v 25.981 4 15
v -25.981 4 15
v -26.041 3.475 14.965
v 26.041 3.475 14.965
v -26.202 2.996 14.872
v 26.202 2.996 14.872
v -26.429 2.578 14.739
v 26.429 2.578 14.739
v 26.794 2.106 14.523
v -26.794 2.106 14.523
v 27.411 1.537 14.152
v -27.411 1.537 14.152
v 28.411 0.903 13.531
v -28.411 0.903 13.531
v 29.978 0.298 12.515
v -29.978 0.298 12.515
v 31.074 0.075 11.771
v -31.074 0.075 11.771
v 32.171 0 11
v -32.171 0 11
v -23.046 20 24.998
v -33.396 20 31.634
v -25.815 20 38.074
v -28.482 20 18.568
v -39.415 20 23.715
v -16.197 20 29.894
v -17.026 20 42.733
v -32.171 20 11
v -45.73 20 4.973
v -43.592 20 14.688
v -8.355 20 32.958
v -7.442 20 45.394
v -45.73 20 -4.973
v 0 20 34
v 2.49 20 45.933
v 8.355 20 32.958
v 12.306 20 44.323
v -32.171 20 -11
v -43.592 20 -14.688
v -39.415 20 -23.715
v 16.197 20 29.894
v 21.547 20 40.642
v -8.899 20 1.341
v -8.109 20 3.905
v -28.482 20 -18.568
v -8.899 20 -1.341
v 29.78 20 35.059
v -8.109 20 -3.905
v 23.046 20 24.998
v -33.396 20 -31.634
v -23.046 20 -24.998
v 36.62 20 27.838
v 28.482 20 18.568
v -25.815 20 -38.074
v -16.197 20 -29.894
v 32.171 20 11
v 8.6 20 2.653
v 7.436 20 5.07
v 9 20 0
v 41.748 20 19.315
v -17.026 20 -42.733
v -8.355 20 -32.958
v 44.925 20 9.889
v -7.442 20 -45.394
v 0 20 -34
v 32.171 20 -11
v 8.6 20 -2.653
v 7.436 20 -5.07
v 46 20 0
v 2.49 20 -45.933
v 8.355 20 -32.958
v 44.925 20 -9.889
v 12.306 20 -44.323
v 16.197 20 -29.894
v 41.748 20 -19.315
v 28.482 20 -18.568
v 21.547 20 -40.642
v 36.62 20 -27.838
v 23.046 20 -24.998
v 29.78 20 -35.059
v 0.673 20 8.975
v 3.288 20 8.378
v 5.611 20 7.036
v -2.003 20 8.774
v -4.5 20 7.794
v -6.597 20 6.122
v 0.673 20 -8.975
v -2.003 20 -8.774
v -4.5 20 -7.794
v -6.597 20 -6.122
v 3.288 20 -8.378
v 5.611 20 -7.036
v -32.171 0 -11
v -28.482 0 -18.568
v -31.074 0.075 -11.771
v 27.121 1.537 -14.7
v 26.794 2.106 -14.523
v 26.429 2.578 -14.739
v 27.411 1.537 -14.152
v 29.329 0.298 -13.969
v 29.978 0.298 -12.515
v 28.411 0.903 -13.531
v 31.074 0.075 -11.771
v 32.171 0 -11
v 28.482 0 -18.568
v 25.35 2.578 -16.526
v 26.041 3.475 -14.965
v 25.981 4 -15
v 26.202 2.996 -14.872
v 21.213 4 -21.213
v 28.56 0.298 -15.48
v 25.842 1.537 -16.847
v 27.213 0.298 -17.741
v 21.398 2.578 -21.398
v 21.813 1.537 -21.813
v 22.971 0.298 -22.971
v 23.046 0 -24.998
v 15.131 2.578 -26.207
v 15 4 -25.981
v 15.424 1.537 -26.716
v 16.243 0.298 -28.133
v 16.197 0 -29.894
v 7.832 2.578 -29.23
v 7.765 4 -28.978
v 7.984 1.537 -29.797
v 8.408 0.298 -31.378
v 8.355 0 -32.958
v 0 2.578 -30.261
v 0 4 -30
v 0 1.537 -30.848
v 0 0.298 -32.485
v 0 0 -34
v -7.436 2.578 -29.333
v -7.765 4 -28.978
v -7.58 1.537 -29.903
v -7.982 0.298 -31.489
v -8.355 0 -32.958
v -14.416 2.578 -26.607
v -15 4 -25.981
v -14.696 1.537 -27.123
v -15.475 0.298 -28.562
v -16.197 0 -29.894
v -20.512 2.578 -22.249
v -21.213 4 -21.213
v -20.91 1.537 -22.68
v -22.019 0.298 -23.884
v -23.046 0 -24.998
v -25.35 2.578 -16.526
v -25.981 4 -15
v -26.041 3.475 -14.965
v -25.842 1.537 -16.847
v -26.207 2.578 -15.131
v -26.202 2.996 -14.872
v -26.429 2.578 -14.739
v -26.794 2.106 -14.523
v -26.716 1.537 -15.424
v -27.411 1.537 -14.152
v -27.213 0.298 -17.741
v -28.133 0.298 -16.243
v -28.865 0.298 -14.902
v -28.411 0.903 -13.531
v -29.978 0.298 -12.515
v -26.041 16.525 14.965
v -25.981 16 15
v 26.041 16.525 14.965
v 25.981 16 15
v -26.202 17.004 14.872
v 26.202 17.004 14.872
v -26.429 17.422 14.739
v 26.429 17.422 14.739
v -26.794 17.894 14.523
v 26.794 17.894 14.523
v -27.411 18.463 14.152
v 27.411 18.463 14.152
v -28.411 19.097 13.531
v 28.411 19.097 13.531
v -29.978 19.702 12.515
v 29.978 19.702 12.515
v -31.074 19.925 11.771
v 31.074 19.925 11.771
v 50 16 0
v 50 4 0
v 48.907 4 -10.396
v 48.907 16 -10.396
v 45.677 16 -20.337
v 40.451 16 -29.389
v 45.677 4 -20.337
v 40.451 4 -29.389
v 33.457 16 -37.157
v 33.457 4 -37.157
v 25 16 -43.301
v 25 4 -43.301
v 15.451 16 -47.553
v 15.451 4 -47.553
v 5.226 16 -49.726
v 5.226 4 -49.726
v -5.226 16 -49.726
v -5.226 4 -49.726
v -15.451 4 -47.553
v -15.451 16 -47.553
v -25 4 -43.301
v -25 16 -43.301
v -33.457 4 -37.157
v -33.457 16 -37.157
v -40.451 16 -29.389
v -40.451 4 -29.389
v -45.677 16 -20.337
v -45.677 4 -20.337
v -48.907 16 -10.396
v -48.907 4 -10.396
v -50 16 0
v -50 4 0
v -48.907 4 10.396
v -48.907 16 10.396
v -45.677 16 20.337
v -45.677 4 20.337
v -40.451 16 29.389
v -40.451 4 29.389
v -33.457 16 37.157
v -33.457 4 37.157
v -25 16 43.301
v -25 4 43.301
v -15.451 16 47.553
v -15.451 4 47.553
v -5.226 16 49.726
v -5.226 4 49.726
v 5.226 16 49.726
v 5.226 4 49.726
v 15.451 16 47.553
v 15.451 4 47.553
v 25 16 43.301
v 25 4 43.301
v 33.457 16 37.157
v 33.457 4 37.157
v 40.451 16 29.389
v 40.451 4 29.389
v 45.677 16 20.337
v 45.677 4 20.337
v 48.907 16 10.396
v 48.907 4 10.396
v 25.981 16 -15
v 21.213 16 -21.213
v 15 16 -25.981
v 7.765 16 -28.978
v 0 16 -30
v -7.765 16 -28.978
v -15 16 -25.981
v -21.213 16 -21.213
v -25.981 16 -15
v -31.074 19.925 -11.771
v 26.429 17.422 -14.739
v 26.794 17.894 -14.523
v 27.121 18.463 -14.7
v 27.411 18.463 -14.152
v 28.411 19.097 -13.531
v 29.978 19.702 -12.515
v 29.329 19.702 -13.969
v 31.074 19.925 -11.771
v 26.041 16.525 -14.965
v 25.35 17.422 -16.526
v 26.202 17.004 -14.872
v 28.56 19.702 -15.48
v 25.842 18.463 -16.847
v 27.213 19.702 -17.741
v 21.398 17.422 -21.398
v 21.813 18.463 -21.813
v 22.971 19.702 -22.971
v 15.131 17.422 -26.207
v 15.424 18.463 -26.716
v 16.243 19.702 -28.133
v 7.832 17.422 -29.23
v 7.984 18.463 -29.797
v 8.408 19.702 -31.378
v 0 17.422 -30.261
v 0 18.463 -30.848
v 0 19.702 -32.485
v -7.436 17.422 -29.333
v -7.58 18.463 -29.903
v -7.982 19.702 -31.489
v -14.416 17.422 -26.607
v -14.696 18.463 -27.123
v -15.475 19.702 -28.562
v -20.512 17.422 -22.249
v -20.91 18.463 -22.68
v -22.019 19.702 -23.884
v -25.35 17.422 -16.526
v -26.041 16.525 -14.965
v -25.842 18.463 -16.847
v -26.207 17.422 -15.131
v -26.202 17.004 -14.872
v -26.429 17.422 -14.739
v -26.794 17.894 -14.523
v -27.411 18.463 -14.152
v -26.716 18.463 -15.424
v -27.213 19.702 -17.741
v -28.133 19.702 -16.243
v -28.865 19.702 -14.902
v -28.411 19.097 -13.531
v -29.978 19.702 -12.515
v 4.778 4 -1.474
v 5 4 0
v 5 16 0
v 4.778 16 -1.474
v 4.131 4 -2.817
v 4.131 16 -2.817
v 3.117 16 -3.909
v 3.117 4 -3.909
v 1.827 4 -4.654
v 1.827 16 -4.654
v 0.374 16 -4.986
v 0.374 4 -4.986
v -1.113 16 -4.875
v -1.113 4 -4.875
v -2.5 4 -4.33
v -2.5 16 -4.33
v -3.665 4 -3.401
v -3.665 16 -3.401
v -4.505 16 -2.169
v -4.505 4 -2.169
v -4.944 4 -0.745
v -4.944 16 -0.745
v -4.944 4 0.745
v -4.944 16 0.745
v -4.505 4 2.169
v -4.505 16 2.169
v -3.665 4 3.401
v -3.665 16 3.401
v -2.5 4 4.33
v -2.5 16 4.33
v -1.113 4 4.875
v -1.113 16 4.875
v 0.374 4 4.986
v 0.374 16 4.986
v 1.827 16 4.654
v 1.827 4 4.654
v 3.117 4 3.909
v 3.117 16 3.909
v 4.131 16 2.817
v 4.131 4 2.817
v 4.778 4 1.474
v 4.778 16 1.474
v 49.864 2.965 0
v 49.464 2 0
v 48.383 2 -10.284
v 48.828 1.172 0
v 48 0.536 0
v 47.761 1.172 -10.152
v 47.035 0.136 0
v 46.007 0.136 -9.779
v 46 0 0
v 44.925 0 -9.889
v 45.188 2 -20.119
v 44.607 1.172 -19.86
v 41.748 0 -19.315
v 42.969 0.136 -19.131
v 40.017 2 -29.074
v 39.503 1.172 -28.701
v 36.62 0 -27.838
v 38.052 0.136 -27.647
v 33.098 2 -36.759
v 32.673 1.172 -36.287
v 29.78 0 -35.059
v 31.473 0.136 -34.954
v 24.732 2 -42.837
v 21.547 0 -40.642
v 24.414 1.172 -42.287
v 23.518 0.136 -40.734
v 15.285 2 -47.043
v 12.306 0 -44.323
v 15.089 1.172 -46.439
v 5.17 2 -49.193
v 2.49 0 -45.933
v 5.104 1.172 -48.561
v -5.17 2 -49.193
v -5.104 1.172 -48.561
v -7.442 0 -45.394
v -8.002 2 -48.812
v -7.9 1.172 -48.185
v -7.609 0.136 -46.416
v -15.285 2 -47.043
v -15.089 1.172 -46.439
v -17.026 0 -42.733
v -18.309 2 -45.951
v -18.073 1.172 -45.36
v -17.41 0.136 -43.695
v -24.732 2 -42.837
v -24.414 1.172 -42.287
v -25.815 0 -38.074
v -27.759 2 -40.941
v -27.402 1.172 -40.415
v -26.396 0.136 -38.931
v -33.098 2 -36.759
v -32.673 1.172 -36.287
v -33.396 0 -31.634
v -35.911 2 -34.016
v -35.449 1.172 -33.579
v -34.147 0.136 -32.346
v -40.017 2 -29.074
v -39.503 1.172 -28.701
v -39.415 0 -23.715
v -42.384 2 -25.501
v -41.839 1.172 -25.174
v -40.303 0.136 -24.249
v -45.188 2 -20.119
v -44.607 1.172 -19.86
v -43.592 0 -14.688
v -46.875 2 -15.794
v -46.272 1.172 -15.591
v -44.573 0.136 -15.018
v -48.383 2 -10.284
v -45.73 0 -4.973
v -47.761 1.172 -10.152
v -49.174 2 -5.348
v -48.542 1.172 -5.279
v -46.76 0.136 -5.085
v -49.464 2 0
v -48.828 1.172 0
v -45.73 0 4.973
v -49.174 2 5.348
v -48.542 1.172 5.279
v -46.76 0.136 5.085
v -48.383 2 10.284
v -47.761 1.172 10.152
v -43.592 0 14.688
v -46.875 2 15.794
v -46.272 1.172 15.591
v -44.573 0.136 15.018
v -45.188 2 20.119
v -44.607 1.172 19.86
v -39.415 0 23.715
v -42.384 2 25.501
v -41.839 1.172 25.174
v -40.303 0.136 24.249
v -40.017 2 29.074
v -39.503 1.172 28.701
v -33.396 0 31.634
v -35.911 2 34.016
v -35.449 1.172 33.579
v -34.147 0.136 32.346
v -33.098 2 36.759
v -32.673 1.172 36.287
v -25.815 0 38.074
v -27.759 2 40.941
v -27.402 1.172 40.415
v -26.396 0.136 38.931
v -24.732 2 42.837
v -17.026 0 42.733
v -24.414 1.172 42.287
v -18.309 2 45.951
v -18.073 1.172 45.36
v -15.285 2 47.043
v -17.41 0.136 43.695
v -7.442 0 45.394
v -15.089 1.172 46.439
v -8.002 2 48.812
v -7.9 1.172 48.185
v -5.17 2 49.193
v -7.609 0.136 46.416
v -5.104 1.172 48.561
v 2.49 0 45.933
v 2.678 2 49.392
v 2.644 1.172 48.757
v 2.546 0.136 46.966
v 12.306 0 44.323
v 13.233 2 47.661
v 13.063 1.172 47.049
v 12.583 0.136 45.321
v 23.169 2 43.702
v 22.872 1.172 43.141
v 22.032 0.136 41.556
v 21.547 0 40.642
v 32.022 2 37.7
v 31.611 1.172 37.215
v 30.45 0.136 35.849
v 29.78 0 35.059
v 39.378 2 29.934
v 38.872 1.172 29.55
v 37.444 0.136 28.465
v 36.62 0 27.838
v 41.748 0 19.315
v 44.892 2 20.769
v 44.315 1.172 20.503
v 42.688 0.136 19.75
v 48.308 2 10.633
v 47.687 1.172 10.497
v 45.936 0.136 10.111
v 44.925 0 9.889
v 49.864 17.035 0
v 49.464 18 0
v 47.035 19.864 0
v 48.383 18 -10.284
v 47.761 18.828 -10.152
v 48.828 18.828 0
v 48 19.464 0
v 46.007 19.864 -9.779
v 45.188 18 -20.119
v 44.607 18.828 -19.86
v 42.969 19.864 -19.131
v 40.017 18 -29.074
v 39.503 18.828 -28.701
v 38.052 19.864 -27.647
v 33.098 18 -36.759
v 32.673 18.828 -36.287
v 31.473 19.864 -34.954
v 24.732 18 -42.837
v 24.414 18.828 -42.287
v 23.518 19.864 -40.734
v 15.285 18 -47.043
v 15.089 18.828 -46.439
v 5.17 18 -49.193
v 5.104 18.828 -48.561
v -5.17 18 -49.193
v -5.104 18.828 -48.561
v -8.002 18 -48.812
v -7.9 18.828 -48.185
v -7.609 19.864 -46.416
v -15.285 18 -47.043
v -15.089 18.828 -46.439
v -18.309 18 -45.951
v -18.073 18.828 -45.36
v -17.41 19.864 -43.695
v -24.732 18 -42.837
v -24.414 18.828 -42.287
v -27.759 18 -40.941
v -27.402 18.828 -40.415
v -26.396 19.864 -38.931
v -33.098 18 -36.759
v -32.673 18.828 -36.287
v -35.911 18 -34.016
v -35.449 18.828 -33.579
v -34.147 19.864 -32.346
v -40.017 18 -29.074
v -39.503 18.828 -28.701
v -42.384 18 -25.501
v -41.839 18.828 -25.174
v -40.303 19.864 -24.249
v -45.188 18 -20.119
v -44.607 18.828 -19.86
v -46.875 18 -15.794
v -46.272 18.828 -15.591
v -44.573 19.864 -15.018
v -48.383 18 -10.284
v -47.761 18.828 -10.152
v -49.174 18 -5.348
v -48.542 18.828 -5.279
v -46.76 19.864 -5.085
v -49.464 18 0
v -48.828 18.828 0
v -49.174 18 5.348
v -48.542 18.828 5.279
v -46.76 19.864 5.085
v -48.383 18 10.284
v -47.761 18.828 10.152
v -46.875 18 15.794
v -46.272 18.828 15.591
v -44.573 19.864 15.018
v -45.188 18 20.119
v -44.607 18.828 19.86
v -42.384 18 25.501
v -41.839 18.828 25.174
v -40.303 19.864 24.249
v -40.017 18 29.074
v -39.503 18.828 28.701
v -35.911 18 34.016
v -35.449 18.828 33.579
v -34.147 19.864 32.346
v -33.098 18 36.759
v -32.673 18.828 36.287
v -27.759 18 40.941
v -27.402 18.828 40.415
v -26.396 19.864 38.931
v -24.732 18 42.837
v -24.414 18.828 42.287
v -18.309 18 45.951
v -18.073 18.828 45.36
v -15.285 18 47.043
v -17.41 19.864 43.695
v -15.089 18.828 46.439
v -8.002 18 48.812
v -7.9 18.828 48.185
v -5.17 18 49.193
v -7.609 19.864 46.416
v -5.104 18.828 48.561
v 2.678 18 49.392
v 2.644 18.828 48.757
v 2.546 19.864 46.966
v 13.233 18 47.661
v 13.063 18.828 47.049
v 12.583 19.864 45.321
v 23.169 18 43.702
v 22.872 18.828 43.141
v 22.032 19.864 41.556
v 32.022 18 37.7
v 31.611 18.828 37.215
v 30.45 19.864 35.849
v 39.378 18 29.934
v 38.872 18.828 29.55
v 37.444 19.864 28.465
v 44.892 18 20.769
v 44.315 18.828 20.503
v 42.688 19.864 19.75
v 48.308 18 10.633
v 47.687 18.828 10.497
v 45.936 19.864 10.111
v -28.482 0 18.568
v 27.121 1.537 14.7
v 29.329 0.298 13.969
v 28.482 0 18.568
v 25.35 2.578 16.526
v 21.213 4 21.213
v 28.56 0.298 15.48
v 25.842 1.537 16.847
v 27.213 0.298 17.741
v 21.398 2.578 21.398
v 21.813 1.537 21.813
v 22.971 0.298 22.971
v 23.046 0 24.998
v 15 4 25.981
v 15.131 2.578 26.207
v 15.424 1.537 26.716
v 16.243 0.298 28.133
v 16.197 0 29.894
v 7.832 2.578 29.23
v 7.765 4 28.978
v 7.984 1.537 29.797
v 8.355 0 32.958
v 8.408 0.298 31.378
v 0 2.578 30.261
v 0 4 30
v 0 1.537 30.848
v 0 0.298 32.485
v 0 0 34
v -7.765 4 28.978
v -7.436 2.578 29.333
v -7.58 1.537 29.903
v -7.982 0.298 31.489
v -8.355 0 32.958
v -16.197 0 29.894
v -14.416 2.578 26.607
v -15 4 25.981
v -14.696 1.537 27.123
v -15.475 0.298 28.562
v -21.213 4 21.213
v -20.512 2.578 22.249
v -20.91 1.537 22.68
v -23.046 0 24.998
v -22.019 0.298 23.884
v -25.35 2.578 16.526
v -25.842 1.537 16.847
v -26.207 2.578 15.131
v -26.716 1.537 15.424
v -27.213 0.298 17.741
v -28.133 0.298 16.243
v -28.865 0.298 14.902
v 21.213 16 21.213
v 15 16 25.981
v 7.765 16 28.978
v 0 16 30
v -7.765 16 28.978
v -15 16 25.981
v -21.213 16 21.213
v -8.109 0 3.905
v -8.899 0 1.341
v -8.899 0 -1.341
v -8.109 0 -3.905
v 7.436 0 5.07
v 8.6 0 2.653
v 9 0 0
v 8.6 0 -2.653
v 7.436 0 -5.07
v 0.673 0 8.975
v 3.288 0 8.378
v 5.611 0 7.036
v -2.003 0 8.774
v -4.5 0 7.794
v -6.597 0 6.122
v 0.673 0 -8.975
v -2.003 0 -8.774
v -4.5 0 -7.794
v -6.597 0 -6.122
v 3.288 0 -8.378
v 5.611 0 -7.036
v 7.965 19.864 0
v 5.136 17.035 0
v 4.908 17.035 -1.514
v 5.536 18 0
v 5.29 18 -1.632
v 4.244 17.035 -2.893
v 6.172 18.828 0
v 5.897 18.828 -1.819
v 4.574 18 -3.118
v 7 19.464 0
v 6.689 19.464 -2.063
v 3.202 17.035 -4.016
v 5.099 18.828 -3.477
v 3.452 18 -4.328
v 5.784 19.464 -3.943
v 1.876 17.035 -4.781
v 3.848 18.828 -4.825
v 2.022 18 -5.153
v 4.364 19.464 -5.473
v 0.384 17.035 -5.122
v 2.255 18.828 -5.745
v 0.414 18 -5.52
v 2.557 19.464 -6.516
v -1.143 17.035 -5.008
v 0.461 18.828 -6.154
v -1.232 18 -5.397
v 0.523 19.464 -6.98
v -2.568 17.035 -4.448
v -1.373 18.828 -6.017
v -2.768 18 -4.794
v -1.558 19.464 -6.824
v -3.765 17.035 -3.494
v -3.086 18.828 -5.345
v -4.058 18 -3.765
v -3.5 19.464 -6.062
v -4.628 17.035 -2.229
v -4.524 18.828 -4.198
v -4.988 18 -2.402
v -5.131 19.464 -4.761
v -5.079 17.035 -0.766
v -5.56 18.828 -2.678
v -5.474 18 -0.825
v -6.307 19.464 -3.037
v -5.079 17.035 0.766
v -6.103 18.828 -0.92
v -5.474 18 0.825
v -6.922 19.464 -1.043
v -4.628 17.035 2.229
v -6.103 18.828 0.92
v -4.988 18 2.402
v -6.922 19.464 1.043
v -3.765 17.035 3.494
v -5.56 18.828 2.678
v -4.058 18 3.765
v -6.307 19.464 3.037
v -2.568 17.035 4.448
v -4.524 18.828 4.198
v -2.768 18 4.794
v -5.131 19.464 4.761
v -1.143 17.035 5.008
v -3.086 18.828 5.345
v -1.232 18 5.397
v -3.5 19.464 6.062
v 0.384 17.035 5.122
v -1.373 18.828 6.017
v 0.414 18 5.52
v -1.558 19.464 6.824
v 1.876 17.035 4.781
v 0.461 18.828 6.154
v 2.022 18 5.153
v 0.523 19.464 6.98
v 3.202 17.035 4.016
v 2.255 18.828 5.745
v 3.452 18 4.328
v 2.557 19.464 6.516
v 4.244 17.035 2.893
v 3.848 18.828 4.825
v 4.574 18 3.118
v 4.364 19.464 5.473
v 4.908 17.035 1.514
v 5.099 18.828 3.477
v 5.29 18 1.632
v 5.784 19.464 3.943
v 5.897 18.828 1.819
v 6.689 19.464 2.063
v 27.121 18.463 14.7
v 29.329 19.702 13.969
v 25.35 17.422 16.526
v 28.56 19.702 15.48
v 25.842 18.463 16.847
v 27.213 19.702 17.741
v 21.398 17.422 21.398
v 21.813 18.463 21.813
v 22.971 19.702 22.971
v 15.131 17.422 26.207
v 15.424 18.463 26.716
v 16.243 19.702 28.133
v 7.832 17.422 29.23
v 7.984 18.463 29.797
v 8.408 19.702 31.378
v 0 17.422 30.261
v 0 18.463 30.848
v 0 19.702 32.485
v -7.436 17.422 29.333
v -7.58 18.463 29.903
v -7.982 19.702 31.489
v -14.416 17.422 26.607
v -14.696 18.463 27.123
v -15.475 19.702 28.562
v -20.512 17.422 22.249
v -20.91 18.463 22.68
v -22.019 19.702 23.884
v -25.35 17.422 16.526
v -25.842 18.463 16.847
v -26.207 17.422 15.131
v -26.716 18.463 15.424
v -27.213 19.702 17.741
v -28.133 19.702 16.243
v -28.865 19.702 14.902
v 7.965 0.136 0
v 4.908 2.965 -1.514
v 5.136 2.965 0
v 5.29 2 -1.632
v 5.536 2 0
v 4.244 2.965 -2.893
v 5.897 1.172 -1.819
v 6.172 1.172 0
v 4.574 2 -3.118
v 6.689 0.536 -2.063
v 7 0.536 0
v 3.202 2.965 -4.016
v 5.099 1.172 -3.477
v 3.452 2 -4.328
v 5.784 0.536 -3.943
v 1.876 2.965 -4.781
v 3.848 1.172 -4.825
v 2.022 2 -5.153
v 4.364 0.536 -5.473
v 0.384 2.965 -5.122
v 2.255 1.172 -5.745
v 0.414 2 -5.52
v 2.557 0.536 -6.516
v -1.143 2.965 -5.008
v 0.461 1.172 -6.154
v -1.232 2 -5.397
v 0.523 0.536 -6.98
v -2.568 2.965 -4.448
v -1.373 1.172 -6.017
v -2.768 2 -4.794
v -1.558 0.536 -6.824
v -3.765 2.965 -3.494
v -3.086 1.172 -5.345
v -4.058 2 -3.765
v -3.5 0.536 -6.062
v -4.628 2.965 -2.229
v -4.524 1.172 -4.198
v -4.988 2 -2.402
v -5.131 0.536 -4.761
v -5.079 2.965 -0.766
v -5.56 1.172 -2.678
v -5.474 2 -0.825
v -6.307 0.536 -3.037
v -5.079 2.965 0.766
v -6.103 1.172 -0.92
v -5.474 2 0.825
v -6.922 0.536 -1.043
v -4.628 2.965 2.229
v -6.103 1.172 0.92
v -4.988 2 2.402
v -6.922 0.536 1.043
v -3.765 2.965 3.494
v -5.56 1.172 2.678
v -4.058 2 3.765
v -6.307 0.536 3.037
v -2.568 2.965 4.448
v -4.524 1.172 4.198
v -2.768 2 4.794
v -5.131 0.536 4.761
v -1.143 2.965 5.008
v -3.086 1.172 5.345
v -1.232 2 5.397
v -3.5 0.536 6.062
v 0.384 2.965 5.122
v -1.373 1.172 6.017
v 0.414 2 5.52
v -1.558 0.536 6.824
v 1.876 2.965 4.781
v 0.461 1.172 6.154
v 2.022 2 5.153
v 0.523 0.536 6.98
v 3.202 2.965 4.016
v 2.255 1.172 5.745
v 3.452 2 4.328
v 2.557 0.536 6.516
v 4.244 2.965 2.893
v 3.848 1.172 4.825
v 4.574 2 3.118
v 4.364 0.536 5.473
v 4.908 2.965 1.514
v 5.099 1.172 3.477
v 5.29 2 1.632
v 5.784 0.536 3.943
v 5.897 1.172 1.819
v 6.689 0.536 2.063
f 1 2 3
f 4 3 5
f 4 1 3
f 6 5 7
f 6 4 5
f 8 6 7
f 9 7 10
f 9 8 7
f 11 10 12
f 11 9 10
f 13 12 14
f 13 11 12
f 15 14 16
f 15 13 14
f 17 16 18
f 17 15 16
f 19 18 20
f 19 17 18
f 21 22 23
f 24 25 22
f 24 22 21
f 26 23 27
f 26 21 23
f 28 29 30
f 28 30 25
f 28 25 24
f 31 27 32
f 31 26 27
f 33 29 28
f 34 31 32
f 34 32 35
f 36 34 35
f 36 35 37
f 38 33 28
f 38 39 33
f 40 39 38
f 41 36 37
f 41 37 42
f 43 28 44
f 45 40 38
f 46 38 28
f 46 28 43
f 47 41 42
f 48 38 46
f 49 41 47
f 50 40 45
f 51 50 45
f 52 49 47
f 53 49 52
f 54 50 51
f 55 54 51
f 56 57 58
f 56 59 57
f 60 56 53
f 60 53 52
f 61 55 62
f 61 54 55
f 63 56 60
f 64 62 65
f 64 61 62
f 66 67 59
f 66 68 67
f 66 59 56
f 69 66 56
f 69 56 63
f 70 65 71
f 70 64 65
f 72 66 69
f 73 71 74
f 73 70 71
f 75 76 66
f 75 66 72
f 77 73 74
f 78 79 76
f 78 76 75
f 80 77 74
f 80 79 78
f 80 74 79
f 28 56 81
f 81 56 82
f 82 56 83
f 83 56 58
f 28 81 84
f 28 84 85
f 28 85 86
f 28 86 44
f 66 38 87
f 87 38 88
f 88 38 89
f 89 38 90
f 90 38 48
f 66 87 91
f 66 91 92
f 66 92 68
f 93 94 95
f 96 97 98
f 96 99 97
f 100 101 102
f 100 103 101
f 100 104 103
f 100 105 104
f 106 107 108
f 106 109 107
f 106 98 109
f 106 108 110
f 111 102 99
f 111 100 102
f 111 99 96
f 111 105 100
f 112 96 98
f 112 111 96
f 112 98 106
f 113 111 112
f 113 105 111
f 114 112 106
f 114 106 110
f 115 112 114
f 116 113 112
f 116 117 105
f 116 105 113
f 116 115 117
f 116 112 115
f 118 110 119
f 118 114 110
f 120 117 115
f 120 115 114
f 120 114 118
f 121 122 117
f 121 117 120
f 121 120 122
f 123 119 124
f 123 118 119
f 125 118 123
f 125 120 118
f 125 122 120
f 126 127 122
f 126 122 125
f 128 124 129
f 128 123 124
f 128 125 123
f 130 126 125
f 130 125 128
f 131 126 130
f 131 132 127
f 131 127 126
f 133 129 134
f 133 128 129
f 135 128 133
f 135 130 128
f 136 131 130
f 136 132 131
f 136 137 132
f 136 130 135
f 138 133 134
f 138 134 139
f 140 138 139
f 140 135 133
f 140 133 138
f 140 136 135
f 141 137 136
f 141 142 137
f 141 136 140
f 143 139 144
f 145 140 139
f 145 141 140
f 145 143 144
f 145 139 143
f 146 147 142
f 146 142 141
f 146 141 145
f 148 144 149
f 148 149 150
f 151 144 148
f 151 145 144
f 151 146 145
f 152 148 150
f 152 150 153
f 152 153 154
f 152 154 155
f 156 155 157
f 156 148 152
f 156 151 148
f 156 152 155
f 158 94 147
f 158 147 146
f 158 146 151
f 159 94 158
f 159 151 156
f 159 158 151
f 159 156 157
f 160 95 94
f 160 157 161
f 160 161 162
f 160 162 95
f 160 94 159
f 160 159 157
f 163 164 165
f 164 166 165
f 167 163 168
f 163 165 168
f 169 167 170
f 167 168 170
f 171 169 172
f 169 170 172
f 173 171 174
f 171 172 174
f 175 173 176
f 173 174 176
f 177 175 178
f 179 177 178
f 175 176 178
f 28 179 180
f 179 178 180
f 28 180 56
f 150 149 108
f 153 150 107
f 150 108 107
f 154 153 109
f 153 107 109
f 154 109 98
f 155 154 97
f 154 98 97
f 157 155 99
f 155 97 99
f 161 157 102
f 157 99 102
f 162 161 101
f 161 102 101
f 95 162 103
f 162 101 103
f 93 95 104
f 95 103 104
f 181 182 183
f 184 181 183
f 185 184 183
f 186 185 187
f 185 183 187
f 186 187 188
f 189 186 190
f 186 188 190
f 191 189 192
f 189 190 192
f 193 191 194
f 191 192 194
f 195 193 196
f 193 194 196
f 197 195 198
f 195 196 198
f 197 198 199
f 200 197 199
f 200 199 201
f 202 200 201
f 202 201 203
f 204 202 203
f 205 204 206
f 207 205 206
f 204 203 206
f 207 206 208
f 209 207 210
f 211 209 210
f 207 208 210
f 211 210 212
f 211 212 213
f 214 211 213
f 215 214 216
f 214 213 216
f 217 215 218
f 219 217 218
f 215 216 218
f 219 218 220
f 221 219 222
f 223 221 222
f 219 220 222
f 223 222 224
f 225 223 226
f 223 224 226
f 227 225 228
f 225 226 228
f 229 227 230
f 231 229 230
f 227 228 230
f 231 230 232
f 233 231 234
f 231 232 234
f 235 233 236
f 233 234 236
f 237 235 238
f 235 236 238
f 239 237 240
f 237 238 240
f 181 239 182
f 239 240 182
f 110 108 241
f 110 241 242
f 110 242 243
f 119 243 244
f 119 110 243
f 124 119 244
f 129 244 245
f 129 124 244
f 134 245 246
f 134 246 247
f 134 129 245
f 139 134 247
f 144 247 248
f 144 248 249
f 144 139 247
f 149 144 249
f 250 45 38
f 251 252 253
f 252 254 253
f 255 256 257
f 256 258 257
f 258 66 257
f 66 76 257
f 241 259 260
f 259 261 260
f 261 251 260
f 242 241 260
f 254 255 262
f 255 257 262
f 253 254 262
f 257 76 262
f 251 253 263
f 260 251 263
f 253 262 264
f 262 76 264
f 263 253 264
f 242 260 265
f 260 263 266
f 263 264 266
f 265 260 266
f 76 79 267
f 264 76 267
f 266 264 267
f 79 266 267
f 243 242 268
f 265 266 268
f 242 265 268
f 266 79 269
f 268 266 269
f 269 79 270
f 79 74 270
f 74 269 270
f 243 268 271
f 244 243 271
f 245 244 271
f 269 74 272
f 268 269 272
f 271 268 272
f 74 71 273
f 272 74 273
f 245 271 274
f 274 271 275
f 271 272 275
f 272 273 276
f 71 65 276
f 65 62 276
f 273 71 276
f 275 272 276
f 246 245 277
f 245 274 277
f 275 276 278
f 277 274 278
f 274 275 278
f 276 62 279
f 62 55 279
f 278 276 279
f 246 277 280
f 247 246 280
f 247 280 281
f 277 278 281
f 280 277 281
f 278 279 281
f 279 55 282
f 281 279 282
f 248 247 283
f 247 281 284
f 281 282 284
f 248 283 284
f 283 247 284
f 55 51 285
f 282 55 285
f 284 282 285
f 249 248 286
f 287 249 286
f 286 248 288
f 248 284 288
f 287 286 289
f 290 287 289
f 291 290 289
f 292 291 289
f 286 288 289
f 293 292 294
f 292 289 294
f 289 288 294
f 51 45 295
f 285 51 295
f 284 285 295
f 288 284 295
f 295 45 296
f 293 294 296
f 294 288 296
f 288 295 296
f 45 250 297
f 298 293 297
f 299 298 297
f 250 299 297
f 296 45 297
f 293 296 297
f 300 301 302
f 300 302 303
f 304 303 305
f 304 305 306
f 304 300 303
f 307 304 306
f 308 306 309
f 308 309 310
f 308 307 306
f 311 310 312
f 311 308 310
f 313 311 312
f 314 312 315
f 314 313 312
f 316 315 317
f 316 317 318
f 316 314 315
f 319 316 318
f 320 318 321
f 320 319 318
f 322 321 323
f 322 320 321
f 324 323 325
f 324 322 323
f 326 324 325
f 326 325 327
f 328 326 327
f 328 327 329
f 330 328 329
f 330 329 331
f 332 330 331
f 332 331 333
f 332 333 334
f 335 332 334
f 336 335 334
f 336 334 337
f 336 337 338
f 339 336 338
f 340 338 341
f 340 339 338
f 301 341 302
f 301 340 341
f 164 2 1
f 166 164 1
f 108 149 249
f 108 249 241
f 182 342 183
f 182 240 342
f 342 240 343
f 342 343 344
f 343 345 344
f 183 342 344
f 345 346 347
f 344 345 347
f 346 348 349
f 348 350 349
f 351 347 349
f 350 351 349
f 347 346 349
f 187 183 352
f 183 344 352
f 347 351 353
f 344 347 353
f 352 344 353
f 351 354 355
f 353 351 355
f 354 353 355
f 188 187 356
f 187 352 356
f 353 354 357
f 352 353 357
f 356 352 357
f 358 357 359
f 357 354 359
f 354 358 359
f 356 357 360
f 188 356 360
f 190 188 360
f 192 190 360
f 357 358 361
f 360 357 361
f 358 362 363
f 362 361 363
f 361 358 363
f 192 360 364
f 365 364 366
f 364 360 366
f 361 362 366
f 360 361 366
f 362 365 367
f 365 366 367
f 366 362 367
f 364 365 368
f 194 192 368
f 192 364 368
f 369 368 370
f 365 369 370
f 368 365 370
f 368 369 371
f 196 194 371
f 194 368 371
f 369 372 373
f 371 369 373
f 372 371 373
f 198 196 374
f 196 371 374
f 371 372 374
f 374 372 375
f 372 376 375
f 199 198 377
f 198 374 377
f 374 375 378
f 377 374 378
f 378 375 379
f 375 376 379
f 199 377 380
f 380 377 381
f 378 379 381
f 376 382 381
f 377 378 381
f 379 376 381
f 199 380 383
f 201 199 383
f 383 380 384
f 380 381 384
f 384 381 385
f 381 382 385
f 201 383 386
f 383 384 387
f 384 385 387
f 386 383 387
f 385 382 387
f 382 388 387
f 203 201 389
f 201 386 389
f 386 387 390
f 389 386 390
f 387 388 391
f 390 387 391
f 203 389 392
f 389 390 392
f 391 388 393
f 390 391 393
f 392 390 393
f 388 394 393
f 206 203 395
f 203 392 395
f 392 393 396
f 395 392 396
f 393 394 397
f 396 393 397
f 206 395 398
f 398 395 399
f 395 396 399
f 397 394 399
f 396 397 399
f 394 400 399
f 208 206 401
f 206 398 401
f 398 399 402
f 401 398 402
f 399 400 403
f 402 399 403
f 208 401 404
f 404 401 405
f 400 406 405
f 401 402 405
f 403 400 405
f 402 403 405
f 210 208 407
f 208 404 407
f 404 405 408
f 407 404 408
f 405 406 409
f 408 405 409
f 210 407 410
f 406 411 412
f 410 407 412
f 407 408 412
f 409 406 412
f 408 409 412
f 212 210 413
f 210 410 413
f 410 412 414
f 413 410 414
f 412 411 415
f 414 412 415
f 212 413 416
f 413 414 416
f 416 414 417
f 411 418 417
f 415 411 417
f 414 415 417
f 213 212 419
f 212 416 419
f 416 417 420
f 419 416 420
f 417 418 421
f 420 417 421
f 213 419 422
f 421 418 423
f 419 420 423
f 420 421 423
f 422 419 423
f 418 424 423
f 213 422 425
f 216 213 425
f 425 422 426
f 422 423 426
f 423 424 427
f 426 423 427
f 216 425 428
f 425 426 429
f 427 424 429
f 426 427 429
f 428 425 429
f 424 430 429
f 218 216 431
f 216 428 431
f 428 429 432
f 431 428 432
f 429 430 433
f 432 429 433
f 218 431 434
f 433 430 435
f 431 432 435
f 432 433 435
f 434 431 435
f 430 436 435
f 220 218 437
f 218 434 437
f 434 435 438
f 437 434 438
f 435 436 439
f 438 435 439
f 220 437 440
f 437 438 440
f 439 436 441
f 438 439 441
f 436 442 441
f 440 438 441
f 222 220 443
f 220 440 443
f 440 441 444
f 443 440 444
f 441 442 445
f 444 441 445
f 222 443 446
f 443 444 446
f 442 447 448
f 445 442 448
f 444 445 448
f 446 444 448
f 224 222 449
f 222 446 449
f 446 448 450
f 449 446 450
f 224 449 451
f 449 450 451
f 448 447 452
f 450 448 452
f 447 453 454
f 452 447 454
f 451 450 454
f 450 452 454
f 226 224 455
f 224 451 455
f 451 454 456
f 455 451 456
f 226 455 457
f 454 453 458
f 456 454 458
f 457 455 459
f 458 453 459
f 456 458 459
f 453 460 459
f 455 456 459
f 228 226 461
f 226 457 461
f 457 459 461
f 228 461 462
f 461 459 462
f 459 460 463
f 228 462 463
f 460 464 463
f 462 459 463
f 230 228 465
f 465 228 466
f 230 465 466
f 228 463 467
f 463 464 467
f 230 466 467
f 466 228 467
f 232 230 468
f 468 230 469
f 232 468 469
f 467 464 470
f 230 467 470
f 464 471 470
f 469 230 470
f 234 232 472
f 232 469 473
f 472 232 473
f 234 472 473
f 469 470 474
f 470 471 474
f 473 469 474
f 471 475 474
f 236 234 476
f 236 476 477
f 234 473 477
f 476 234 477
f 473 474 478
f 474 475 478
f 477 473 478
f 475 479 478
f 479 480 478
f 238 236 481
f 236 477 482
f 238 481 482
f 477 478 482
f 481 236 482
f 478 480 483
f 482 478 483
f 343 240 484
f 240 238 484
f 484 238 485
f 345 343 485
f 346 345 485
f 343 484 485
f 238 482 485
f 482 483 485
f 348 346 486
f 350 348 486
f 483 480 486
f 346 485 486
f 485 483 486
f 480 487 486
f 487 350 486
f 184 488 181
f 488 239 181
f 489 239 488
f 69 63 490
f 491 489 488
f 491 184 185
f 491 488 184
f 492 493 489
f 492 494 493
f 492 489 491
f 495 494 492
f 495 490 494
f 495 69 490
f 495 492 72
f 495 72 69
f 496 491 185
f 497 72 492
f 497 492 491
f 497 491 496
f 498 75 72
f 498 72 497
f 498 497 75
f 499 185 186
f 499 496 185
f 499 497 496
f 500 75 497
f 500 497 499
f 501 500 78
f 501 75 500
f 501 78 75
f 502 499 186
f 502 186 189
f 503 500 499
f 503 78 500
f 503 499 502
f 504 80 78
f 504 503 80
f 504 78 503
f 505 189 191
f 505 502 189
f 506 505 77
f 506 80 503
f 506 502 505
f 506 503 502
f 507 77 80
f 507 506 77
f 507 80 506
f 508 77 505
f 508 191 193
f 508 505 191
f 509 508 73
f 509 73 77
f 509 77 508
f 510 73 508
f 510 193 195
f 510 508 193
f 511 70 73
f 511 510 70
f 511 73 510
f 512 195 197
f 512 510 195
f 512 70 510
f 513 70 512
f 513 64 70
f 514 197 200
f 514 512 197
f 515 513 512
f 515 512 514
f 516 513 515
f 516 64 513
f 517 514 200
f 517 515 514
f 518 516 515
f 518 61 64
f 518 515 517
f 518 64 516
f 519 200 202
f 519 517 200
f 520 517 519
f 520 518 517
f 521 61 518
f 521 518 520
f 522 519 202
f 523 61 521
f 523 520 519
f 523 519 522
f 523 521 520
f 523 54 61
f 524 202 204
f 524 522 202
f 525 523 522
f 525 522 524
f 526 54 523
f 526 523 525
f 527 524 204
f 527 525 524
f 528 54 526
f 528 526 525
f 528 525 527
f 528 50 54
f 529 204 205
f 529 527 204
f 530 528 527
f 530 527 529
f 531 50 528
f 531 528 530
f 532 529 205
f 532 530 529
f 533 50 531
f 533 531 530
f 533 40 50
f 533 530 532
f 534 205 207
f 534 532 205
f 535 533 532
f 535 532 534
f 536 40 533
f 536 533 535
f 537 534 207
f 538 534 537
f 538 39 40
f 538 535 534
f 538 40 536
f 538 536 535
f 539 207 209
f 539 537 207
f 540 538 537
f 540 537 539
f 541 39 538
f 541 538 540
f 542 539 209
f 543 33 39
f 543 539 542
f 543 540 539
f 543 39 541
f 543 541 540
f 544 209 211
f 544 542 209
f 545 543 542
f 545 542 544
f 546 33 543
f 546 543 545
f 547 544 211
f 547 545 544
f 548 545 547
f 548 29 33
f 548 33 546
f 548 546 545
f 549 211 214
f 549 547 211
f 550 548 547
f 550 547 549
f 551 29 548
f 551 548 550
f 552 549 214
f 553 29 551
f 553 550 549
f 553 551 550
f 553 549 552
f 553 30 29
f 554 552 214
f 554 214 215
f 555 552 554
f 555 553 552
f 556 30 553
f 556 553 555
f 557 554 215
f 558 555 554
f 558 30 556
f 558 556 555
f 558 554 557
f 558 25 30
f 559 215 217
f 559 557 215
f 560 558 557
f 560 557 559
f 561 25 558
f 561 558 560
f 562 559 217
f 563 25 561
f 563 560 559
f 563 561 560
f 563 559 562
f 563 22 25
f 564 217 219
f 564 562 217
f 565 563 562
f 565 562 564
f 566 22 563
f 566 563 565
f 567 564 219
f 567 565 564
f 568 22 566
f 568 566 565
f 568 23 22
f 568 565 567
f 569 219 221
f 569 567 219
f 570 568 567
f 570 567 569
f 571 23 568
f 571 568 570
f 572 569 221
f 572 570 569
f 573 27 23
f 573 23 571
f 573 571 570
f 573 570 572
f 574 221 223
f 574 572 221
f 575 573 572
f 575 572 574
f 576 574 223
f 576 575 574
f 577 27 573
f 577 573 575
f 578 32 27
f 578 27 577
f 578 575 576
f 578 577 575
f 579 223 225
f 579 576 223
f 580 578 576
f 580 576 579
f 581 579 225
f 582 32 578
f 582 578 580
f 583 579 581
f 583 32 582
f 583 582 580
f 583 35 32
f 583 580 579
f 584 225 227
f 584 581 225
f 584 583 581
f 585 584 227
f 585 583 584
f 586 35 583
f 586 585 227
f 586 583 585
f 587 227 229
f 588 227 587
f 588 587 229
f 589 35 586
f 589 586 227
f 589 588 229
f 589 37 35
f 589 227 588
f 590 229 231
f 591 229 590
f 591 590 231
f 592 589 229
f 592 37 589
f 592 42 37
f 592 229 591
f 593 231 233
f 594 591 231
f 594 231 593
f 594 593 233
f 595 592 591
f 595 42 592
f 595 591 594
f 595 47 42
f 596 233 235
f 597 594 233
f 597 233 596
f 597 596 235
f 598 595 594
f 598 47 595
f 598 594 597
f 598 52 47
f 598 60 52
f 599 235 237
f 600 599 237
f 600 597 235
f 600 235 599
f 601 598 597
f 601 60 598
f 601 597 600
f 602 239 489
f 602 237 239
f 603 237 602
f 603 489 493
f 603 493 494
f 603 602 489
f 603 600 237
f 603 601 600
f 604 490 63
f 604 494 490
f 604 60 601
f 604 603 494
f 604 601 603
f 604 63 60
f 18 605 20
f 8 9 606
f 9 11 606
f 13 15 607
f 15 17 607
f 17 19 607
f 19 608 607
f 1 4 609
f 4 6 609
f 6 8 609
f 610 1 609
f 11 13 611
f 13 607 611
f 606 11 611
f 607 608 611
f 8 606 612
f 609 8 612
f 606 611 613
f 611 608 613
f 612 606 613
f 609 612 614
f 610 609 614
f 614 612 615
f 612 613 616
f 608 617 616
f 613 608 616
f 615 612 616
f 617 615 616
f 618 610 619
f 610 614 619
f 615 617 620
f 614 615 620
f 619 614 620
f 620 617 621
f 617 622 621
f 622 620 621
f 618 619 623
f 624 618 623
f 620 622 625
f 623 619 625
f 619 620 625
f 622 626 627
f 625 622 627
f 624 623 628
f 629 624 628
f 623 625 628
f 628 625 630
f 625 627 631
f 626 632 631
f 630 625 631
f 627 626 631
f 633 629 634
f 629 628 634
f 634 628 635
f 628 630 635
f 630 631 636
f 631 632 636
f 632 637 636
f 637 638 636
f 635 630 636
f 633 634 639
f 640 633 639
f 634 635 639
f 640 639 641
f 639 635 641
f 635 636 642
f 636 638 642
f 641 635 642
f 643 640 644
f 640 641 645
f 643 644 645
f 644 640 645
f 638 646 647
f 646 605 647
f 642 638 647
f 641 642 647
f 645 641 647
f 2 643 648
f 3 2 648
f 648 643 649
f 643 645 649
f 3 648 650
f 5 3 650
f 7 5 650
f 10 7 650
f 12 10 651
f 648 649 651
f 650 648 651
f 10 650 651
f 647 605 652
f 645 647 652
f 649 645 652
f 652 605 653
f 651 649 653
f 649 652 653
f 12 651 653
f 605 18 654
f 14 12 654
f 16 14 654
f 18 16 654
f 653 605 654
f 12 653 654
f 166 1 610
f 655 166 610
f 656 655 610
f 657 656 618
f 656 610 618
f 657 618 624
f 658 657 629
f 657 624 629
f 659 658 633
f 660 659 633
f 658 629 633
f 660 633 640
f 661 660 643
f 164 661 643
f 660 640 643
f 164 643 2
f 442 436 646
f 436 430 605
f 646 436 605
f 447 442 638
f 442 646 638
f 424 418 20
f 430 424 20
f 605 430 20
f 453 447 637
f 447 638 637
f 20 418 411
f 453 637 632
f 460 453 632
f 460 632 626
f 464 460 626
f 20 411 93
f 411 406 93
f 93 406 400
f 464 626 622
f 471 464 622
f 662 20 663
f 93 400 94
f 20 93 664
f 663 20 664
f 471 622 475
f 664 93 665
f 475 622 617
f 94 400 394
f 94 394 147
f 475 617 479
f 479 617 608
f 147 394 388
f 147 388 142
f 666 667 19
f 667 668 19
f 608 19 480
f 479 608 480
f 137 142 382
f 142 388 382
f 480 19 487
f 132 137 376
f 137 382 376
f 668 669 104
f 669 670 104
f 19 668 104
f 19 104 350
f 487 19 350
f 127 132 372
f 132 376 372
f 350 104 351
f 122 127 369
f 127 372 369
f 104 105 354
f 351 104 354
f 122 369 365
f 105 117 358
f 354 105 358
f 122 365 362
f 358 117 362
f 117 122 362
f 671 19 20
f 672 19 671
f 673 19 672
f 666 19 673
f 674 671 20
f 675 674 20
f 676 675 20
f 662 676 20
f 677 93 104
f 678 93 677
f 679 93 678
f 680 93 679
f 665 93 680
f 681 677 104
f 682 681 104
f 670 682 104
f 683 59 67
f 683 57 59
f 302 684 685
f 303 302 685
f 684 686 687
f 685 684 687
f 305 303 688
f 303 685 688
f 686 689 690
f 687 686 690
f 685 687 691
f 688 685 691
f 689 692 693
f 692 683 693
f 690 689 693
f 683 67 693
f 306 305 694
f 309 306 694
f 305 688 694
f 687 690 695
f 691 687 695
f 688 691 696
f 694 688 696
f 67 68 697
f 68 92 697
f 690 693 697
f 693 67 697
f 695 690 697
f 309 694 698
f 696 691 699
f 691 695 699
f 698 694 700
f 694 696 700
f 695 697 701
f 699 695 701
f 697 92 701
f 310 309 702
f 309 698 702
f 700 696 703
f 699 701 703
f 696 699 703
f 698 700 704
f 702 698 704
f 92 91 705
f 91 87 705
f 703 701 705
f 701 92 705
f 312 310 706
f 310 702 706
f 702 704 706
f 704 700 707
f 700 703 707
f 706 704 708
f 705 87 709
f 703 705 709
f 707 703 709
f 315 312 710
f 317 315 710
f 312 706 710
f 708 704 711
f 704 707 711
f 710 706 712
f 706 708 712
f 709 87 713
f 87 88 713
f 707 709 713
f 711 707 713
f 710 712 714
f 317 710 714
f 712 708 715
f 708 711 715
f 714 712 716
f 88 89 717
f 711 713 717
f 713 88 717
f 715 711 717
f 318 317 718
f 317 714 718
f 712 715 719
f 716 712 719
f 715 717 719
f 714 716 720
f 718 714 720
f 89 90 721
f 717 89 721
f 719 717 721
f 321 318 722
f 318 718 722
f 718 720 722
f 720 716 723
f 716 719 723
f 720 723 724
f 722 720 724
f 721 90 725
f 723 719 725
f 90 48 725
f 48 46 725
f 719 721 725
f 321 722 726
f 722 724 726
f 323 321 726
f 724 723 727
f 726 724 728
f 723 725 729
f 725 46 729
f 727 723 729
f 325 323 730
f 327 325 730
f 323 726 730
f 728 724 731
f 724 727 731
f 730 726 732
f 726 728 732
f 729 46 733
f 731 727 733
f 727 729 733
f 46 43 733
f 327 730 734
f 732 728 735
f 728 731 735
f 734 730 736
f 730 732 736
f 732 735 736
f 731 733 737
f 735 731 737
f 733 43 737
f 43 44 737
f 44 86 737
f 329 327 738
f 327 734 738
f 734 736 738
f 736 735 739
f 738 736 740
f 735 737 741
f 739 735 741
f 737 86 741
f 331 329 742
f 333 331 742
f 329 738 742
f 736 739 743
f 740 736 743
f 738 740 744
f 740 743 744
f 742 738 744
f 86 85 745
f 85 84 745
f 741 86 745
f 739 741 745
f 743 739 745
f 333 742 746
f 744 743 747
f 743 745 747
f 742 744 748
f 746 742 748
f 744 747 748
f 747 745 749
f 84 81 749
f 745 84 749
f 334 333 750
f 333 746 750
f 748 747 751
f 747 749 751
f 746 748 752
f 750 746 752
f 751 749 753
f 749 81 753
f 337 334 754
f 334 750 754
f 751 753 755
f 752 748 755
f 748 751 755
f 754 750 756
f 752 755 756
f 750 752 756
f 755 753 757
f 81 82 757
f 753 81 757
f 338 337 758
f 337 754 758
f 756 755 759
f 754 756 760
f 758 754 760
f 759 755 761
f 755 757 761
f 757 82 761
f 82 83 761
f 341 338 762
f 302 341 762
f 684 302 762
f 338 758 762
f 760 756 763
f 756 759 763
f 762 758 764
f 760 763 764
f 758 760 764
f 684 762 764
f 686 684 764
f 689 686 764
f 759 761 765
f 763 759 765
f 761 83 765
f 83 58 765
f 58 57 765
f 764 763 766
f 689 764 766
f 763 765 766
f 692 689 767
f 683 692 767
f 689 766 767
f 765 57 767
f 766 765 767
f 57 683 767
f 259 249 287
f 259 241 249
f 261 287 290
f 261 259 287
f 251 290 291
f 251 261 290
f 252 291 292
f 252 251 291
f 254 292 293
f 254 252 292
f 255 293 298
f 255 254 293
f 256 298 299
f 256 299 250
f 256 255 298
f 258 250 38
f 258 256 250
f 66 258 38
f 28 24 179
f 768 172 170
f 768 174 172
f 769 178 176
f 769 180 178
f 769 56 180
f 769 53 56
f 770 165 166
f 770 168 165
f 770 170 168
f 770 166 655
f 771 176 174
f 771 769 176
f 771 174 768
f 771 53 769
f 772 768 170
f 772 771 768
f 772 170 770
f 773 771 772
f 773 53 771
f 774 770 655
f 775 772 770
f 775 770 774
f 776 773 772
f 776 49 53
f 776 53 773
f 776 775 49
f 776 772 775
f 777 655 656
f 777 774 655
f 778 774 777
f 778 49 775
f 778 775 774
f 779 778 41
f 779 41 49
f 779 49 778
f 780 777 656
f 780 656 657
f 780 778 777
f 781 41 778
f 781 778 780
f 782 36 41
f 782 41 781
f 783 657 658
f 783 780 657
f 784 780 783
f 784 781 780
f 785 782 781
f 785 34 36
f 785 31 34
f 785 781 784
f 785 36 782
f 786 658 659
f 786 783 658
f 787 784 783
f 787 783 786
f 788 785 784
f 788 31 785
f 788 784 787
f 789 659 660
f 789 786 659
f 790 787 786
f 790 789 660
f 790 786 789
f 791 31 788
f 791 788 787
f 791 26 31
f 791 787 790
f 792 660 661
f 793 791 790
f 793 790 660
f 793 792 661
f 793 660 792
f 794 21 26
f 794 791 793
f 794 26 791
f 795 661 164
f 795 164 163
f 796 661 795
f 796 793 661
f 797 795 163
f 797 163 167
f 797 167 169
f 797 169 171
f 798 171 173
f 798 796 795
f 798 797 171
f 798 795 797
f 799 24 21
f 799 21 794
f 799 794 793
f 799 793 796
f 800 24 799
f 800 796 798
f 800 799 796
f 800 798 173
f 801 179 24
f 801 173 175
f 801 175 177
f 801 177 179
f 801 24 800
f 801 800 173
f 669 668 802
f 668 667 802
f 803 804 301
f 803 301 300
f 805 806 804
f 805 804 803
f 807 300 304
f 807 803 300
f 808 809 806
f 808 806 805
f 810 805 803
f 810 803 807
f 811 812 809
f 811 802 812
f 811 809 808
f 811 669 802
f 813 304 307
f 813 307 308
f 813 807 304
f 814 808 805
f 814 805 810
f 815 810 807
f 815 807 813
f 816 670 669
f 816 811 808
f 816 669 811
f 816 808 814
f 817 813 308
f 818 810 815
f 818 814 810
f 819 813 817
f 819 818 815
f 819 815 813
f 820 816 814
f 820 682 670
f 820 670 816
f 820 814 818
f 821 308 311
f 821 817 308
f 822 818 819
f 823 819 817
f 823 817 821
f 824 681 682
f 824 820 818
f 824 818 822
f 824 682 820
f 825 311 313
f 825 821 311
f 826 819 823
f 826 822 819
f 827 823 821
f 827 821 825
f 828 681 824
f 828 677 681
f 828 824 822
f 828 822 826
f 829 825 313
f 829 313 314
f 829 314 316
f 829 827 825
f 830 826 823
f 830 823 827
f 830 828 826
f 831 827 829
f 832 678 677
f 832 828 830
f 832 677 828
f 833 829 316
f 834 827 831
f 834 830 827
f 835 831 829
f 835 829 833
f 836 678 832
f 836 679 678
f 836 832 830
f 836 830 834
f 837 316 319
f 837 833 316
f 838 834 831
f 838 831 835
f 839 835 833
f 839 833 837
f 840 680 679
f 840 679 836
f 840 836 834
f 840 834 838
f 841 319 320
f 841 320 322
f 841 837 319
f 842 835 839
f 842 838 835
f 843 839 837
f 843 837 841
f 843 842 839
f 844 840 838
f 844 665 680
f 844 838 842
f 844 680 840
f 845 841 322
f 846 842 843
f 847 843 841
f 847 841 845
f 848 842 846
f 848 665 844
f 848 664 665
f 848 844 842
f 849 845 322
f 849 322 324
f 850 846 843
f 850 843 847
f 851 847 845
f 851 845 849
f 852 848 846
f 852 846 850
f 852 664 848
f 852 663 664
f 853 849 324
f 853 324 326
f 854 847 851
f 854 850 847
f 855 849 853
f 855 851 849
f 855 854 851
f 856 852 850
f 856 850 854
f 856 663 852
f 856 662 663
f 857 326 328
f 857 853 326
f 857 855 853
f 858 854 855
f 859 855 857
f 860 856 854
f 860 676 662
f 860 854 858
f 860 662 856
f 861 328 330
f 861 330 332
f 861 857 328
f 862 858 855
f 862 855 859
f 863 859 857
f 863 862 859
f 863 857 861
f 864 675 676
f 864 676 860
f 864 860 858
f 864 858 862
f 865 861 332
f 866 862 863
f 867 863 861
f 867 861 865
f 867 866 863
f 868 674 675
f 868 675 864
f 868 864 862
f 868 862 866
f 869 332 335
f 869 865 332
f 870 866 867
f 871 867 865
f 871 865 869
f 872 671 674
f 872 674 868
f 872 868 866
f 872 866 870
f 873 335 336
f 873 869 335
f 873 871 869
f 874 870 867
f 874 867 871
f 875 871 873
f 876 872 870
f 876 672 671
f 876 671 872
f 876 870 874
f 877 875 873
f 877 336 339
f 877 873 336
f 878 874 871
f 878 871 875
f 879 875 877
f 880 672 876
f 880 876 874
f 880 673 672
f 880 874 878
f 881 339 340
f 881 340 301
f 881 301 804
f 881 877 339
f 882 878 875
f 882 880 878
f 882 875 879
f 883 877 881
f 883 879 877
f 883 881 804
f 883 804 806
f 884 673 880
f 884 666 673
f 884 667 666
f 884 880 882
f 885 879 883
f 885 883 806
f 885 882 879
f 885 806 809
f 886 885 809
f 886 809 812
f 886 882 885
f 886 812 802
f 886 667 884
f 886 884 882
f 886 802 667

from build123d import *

# Parameters (mm, degrees)
ESQUISSE1_R      = 50
ESQUISSE1_R_2    = 5
EXTRUSION1_DEPTH = 20
CONG_1_R         = 4


with BuildPart() as part:
    # Esquisse1 → Extrusion1 (new body)
    with BuildSketch(Plane(origin=(0, 0, 0), x_dir=(1, 0, 0), z_dir=(0, 1, 0))):
        Circle(ESQUISSE1_R)
        Circle(ESQUISSE1_R_2, mode=Mode.SUBTRACT)
        with BuildLine():
            Line((-25.980762114, 15), (25.980762114, 15))
            ThreePointArc((25.980762114, 15), (0, 30), (-25.980762114, 15))
        make_face(mode=Mode.SUBTRACT)
        with BuildLine():
            Line((-25.980762114, -15), (25.980762114, -15))
            ThreePointArc((25.980762114, -15), (0, -30), (-25.980762114, -15))
        make_face(mode=Mode.SUBTRACT)
    extrude(amount=EXTRUSION1_DEPTH)

    # Congé1
    cong_1_edges = [part.edges().sort_by_distance(p)[0] for p in [
        (0, 0, 30),
        (0, 0, 15),
        (0, 20, 30),
        (0, 20, 15),
        (-50, 0, 0),
        (-5, 0, 0),
        (-5, 20, 0),
        (-50, 20, 0),
        (0, 0, -30),
        (0, 0, -15),
        (0, 20, -30),
        (0, 20, -15),
    ]]
    fillet(cong_1_edges, radius=CONG_1_R)


solid = part.part
